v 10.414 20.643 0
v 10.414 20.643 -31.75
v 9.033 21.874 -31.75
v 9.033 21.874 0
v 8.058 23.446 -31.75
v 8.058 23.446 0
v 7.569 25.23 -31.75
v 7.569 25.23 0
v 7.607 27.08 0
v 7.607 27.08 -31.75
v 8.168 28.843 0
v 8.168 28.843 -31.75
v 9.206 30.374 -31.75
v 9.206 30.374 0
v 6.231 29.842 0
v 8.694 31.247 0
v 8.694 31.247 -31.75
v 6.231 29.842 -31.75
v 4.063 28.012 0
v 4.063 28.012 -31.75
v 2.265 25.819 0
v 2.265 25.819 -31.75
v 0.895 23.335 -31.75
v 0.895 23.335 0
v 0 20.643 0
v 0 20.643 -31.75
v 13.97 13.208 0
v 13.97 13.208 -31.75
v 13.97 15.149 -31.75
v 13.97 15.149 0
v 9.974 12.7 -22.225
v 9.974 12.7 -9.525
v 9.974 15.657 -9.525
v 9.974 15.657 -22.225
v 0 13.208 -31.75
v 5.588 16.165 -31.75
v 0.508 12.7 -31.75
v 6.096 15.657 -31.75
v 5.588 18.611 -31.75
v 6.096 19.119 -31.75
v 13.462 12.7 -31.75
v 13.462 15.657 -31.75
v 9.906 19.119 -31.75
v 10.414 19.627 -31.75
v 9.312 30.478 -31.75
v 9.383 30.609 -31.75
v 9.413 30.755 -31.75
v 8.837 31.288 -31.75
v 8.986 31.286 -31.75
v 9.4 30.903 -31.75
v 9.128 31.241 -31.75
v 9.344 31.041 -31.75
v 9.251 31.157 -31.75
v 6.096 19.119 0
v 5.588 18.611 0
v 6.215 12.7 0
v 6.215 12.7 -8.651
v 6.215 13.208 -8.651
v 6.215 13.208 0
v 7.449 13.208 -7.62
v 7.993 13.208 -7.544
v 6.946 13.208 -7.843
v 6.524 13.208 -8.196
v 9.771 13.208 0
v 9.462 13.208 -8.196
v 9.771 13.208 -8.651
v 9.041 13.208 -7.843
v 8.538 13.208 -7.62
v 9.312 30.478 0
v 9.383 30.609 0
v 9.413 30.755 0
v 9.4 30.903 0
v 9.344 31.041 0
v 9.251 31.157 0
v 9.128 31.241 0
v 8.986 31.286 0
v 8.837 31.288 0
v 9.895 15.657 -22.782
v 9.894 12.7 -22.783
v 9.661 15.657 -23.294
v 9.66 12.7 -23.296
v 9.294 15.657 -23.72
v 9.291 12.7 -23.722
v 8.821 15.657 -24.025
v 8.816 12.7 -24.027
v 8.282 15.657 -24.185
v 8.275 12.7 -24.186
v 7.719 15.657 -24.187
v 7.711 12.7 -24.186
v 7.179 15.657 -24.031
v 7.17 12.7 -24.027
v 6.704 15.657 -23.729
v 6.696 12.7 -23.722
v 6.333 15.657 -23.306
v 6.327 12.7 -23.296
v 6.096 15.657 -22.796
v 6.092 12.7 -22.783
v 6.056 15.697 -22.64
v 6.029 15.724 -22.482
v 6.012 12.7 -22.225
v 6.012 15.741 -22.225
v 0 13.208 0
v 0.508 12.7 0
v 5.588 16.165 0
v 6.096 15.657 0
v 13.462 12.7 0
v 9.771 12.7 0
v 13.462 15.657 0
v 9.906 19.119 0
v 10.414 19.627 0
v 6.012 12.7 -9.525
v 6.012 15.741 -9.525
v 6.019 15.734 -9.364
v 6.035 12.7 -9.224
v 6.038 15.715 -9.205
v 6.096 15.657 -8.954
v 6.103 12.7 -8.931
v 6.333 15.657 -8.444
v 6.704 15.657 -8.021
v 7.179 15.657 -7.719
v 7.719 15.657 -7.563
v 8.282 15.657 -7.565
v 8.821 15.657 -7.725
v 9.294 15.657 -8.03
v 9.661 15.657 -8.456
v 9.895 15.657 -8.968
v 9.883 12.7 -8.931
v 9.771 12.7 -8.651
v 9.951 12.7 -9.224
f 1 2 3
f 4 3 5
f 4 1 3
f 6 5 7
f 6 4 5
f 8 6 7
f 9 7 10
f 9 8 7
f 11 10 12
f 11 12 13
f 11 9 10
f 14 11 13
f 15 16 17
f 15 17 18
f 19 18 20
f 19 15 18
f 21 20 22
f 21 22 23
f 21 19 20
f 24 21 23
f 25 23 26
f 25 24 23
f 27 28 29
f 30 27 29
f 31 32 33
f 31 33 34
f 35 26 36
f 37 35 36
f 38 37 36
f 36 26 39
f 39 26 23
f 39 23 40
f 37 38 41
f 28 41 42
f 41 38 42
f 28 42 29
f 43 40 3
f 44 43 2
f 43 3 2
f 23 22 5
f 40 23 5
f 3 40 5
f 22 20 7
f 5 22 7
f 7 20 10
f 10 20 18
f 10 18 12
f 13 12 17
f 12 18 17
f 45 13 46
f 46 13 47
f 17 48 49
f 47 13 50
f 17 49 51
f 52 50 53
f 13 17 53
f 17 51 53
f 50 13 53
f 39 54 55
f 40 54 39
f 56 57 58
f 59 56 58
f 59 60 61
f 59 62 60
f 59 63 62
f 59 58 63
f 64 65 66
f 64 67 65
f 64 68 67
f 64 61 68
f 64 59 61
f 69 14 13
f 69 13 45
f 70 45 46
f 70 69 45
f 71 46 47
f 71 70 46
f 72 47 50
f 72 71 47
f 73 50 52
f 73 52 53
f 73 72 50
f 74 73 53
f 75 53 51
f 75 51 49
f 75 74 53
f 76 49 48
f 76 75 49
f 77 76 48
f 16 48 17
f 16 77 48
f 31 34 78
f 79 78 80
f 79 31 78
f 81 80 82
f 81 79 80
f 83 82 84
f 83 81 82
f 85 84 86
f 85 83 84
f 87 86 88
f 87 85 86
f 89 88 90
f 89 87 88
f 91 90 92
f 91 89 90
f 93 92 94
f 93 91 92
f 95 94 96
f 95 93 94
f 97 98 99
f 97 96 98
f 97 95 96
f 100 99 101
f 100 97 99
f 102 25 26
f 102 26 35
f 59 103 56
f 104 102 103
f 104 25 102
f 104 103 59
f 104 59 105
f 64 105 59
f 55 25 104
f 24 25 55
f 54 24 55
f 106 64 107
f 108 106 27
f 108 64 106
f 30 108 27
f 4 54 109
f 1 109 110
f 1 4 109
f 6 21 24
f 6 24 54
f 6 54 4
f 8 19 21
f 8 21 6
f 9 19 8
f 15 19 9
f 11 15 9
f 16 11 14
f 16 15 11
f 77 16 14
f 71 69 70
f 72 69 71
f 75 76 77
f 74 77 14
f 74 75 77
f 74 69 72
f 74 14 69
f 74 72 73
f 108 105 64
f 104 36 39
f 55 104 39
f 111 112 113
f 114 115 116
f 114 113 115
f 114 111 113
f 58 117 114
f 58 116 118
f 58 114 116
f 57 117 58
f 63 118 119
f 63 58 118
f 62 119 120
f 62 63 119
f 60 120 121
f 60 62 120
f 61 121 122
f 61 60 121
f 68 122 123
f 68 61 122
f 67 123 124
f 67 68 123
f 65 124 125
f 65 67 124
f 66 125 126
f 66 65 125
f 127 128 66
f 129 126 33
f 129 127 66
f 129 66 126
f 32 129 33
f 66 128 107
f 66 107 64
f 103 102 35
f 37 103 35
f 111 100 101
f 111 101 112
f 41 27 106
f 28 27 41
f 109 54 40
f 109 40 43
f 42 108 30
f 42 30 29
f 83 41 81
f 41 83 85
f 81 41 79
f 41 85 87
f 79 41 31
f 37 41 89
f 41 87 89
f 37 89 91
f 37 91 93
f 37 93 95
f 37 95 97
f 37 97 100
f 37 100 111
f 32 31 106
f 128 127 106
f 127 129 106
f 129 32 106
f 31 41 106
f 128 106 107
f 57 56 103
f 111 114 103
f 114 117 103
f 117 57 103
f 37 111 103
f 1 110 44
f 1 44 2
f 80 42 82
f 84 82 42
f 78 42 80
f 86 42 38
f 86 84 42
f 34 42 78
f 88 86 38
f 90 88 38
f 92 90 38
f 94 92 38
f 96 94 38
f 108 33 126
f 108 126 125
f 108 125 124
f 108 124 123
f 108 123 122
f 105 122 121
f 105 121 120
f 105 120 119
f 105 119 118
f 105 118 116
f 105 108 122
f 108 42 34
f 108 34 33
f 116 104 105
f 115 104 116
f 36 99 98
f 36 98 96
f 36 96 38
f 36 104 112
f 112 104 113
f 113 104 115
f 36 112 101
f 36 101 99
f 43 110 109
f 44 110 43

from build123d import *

# Parameters (mm, degrees)
BOSS_EXTRUDE1_DEPTH     = 31.75
CHAMFER1_SIZE           = 0.508
BOSS_EXTRUDE2_DEPTH     = 2.956637053
CUT_EXTRUDE1_REACH      = 41.356
CUT_EXTRUDE2_REACH      = 48.717
CUT_EXTRUDE2_END_RADIUS = 1.9812
SKETCH7_W               = 3.556
SKETCH7_H               = 1.016


with BuildPart() as part:
    # Sketch1 → Boss-Extrude1 (new body)
    with BuildSketch(Plane.XY):
        with BuildLine():
            Line((0, 12.7), (13.97, 12.7))
            Line((13.97, 12.7), (13.97, 15.656637053))
            Line((13.97, 15.656637053), (5.588, 15.656637053))
            Line((5.588, 15.656637053), (5.588, 19.119334391))
            Line((5.588, 19.119334391), (10.414, 19.119334391))
            Line((10.414, 19.119334391), (10.414, 20.643334391))
            ThreePointArc((10.414, 20.643334391), (7.568862019, 25.230360252), (9.20630181, 30.373745063))
            ThreePointArc((9.20630181, 30.373745063), (9.344088063, 31.041104373), (8.694495233, 31.246974853))
            ThreePointArc((8.694495233, 31.246974853), (3.113774689, 26.956545429), (0, 20.643334391))
            Line((0, 20.643334391), (0, 12.7))
        make_face()
    extrude(amount=-BOSS_EXTRUDE1_DEPTH)

    # Chamfer1
    chamfer1_edges = [part.edges().sort_by_distance(p)[0] for p in [
        (0, 12.7, -15.875),
        (13.97, 12.7, -15.875),
        (13.97, 15.656637053, -15.875),
        (5.588, 15.656637053, -15.875),
        (5.588, 19.119334391, -15.875),
        (10.414, 19.119334391, -15.875),
    ]]
    chamfer(chamfer1_edges, length=CHAMFER1_SIZE)

    # Sketch4 → Boss-Extrude2 (add)
    with BuildSketch(Plane.XZ.offset(-12.7)):
        with BuildLine():
            Line((6.012029018, -22.225), (6.012029018, -9.525))
            ThreePointArc((6.012029018, -9.525), (7.993229018, -7.5438), (9.974429018, -9.525))
            Line((9.974429018, -9.525), (9.974429018, -22.225))
            ThreePointArc((9.974429018, -22.225), (7.993229018, -24.2062), (6.012029018, -22.225))
        make_face()
    extrude(amount=-BOSS_EXTRUDE2_DEPTH)

    # Sketch5 → Cut-Extrude1 (cut, up to next)
    with BuildSketch(Plane.XZ.offset(-12.7), mode=Mode.PRIVATE) as cut_extrude1_sk1:
        with BuildLine():
            Line((6.012029018, -22.225), (6.012029018, -9.525))
            ThreePointArc((6.012029018, -9.525), (7.993229018, -7.5438), (9.974429018, -9.525))
            Line((9.974429018, -9.525), (9.974429018, -22.225))
            ThreePointArc((9.974429018, -22.225), (7.993229018, -24.2062), (6.012029018, -22.225))
        make_face()
    cut_extrude1_tool1 = extrude(cut_extrude1_sk1.sketch, amount=-CUT_EXTRUDE1_REACH, mode=Mode.PRIVATE) & part.part
    add(cut_extrude1_tool1.solids().sort_by_distance((7.993229, 12.7, -15.875))[0], mode=Mode.SUBTRACT)

    # Cut-Extrude2: up to this cylinder (the profile starts outside it)
    cut_extrude2_end = Plane(origin=(7.993229018, 12.7, -9.525), z_dir=(0, -1, 0)) * Cylinder(CUT_EXTRUDE2_END_RADIUS, 102.3964, mode=Mode.PRIVATE)
    # Sketch7 → Cut-Extrude2 (cut, up to the surface)
    with BuildSketch(Plane.XY, mode=Mode.PRIVATE) as cut_extrude2_sk1:
        with Locations((7.993229018, 12.7)):
            Rectangle(SKETCH7_W, SKETCH7_H)
    cut_extrude2_tool1 = extrude(cut_extrude2_sk1.sketch, amount=-CUT_EXTRUDE2_REACH, mode=Mode.PRIVATE) - cut_extrude2_end
    add(cut_extrude2_tool1.solids().sort_by_distance((7.993229, 12.7, 0))[0], mode=Mode.SUBTRACT)


solid = part.part
